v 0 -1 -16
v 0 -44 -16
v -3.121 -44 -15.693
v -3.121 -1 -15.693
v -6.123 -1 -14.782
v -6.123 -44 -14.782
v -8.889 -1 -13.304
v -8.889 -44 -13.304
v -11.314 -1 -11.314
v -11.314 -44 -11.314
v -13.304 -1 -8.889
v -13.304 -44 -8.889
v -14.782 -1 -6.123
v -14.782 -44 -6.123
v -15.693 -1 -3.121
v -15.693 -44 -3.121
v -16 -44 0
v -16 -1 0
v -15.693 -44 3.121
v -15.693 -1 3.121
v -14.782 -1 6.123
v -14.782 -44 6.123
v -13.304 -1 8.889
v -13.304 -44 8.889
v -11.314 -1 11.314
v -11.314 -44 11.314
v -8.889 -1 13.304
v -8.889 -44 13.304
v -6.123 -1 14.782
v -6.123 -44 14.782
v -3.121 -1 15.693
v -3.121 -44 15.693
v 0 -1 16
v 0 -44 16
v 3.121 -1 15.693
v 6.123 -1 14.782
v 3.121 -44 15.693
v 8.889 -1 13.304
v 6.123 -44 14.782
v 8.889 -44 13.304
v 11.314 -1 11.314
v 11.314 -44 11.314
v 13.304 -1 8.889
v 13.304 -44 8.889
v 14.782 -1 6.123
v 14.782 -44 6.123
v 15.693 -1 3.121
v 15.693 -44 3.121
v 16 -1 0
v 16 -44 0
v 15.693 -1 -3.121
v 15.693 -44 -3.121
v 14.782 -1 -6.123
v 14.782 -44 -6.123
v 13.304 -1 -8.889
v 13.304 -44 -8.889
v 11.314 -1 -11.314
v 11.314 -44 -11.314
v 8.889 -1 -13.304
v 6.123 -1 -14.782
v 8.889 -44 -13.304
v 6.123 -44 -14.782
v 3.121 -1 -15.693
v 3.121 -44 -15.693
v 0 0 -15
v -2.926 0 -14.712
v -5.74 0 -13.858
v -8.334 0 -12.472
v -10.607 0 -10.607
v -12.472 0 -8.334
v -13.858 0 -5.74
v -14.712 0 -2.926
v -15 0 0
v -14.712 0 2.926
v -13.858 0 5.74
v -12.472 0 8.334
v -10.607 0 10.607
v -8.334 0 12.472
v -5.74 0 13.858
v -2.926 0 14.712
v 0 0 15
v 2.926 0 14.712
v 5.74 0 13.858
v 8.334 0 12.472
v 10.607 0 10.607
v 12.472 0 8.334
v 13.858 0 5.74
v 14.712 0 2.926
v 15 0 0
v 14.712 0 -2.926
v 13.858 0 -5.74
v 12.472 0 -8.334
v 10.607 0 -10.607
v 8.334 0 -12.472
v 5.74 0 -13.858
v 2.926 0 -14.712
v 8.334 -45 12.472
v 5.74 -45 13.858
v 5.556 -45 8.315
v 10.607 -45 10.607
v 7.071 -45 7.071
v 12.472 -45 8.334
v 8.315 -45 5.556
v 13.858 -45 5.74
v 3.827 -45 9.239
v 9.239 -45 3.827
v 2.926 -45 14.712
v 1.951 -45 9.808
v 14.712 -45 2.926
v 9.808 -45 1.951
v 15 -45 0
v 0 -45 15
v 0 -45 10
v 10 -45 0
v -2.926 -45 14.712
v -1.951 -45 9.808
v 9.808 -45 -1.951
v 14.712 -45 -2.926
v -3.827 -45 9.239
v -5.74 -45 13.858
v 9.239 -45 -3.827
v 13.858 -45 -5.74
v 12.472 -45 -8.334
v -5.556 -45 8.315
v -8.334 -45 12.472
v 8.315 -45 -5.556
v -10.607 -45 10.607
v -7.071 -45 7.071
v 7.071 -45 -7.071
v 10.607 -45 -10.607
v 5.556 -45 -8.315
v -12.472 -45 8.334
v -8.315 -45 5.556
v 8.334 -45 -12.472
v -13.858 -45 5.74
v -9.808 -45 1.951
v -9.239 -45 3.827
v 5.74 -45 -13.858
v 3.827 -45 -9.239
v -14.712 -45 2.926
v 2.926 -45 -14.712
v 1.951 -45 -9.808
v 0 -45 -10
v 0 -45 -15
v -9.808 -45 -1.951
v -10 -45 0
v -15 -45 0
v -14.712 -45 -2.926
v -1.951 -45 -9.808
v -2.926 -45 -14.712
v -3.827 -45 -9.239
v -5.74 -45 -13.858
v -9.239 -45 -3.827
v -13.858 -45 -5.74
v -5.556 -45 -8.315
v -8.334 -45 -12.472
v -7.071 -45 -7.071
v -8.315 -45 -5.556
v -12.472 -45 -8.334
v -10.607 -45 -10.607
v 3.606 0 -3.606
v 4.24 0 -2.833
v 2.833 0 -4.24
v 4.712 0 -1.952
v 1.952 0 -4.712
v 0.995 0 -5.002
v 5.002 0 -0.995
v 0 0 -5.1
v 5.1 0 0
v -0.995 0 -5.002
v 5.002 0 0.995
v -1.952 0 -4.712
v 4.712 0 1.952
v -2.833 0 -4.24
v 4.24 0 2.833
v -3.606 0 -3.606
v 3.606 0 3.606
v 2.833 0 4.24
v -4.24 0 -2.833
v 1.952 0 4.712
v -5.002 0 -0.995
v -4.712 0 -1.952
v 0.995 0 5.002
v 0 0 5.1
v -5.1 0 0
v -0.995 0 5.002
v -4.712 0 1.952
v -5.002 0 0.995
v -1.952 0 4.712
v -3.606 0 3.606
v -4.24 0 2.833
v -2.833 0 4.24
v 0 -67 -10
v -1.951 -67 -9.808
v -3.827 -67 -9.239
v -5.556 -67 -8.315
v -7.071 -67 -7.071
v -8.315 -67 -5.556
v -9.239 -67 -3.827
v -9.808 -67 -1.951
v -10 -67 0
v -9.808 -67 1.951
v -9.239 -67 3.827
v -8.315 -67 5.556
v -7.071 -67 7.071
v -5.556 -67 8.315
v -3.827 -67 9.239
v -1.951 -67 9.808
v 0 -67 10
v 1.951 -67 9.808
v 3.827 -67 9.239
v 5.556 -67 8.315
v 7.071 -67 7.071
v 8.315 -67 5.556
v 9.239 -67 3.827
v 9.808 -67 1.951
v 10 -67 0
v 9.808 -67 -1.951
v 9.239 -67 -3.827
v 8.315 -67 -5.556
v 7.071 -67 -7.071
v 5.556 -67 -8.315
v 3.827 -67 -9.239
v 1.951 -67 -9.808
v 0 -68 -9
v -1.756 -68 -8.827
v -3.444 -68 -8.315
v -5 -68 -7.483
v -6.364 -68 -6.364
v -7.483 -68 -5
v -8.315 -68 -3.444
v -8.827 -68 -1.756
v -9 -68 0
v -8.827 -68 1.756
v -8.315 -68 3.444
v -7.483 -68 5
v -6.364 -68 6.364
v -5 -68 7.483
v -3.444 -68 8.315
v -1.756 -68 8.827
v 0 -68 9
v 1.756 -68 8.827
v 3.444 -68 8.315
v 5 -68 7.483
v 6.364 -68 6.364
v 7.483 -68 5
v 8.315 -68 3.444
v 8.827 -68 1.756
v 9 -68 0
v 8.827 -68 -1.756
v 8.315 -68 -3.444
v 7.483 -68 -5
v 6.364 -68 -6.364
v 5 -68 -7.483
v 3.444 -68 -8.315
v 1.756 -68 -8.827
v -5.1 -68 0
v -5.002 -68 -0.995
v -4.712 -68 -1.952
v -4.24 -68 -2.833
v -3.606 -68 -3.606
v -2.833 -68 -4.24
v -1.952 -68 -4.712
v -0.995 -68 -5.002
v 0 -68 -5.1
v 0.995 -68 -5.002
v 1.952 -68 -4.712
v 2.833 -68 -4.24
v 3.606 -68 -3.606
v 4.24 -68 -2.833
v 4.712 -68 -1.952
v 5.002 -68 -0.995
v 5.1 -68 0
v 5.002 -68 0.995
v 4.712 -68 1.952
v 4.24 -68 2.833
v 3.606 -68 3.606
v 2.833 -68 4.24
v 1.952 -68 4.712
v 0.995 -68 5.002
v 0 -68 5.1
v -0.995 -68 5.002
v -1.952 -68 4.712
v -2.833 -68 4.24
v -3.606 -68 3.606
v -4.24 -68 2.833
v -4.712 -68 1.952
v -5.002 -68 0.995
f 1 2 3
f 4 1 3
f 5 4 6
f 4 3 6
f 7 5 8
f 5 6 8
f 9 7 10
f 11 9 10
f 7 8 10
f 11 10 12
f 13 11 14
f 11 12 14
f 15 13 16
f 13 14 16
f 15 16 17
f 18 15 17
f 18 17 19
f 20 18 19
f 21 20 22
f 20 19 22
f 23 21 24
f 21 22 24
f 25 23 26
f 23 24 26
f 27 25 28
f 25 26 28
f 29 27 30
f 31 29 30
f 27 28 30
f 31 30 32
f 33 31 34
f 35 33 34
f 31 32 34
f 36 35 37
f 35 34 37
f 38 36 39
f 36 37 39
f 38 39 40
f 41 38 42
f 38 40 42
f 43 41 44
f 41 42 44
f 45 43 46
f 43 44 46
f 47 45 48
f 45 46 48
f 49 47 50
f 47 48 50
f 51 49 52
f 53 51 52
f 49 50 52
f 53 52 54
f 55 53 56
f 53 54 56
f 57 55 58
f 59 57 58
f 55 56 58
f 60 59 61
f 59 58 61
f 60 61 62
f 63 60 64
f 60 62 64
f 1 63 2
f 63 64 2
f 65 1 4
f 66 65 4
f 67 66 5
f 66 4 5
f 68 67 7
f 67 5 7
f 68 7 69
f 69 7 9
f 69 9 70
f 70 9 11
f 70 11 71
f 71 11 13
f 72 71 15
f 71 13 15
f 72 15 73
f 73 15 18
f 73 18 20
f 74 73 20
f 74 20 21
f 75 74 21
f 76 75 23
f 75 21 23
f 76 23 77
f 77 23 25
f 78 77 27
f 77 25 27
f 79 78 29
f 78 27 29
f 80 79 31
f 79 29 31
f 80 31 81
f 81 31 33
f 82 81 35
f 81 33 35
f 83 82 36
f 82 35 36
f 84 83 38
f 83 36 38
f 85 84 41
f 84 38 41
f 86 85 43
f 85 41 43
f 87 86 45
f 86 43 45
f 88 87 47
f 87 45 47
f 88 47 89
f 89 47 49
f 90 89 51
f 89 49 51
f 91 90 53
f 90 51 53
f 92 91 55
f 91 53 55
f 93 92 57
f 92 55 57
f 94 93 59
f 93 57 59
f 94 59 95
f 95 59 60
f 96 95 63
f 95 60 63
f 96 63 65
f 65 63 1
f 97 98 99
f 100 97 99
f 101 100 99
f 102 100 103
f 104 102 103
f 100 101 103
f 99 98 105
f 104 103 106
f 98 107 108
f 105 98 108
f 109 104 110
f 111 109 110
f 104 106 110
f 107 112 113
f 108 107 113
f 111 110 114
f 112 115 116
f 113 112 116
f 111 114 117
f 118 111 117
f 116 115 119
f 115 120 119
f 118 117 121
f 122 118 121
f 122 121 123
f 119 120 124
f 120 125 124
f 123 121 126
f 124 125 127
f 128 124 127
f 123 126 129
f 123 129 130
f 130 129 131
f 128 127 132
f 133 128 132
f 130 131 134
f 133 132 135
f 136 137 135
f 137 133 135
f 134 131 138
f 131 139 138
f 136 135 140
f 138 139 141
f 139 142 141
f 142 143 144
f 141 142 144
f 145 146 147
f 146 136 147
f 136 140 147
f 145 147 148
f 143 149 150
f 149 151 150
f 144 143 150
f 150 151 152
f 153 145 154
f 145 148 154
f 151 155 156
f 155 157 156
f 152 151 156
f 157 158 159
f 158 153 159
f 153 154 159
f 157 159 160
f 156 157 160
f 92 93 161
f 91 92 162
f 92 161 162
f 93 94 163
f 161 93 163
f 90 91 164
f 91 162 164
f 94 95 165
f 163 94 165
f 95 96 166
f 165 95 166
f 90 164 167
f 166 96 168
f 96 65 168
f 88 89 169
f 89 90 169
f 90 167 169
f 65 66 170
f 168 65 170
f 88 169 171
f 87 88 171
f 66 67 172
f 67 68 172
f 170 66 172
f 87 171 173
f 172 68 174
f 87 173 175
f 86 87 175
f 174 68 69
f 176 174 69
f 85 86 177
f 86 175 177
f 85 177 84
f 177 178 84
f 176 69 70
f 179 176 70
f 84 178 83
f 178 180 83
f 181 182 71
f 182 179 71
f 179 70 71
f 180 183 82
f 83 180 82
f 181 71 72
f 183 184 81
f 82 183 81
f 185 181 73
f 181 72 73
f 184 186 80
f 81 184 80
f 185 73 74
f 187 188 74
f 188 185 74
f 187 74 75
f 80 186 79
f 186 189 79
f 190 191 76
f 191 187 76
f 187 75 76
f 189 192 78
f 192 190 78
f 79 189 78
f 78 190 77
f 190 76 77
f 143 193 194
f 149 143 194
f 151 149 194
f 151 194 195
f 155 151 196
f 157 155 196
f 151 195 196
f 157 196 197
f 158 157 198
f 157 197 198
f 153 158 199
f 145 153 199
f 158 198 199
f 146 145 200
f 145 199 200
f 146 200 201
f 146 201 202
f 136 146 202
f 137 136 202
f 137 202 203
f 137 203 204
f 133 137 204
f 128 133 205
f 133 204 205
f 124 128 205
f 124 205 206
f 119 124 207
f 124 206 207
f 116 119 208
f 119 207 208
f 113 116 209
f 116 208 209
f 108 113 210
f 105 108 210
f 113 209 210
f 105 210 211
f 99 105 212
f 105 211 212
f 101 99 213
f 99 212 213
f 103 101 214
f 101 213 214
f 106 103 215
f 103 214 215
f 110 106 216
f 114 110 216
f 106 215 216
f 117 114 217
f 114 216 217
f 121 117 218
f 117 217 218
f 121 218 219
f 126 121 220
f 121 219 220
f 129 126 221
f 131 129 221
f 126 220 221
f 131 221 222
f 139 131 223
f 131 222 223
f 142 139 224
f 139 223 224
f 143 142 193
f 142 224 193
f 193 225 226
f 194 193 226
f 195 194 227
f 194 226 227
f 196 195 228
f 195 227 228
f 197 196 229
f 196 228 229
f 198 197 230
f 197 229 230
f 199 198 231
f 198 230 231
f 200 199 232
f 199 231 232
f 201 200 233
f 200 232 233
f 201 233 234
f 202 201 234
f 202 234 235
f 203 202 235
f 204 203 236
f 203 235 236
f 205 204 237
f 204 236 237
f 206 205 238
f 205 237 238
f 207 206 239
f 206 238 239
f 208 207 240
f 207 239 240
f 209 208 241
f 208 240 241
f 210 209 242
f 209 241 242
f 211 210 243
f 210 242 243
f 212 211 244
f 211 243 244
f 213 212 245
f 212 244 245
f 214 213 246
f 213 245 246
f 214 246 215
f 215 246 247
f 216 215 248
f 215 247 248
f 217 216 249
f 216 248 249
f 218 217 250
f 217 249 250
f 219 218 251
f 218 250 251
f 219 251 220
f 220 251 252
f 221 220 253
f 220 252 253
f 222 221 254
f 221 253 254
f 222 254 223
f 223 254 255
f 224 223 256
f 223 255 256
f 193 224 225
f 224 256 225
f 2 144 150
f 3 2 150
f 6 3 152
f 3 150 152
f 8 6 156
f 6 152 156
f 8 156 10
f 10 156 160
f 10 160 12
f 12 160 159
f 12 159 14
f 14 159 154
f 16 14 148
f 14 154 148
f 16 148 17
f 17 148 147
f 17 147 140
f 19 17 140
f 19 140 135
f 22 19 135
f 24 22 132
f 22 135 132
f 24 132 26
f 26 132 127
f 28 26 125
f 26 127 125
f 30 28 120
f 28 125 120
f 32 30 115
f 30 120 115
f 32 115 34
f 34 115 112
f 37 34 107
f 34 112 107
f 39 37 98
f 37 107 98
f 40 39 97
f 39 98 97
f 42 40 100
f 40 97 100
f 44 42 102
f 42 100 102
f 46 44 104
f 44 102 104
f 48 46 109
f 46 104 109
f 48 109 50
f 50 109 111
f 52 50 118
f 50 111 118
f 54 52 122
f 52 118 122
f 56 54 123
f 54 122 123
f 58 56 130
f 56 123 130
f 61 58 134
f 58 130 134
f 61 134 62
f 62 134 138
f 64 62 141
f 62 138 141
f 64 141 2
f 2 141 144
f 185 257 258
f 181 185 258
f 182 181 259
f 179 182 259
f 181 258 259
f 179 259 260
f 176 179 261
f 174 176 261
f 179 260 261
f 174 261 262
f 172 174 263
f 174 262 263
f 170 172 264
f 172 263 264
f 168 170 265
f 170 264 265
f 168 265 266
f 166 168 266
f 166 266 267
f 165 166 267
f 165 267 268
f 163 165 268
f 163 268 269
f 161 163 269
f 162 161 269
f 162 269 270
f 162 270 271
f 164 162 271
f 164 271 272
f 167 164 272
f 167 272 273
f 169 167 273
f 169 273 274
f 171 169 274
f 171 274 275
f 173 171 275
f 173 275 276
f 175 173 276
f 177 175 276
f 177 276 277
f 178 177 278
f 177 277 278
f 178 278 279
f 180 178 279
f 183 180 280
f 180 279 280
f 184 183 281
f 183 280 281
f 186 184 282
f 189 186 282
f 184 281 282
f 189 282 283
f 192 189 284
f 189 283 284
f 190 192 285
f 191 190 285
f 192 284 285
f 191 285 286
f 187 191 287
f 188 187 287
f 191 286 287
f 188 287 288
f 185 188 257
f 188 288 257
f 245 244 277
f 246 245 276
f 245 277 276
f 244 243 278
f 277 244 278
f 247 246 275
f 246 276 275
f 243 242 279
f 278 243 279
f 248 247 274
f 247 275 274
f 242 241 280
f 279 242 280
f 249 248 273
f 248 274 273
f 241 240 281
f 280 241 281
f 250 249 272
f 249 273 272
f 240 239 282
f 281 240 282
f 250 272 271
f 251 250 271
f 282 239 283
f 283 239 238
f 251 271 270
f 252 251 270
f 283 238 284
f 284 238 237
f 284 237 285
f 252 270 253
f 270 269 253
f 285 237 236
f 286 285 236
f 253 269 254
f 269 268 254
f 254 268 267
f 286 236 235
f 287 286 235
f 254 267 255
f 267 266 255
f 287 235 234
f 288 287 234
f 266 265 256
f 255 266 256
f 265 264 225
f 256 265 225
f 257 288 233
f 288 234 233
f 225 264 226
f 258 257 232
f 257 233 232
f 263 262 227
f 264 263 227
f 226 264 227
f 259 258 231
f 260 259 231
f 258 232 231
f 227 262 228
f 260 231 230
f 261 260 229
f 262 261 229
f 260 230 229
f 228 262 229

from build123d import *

# Parameters (mm, degrees)
CHAMFER1_SIZE                = 1
F_10_2_10_2_DIAMETER_HOLE1_D = 10.2


with BuildPart() as part:
    # Sketch1 → Revolve1 (revolve)
    with BuildSketch(Plane.XY, mode=Mode.PRIVATE) as revolve1_sk:
        Polygon((0, 0), (16, 0), (16, -45), (10, -45), (10, -68), (0, -68), align=None)
    revolve(revolve1_sk.sketch.rotate(Axis((0, -73, 0), (0, 1, 0)), 90), axis=Axis((0, -73, 0), (0, 1, 0)))

    # Chamfer1
    chamfer1_edges = [part.edges().sort_by_distance(p)[0] for p in [
        (0, -68, 10),
        (0, -45, 16),
        (0, 0, 16),
    ]]
    chamfer(chamfer1_edges, length=CHAMFER1_SIZE)

    # Ø10.2 (10.2) Diameter Hole1 (through all)
    with Locations(Plane(origin=(0, 0, 0), x_dir=(1, 0, 0), z_dir=(0, 1, 0))):
        with Locations((0, 0)):
            Hole(F_10_2_10_2_DIAMETER_HOLE1_D / 2)


solid = part.part
